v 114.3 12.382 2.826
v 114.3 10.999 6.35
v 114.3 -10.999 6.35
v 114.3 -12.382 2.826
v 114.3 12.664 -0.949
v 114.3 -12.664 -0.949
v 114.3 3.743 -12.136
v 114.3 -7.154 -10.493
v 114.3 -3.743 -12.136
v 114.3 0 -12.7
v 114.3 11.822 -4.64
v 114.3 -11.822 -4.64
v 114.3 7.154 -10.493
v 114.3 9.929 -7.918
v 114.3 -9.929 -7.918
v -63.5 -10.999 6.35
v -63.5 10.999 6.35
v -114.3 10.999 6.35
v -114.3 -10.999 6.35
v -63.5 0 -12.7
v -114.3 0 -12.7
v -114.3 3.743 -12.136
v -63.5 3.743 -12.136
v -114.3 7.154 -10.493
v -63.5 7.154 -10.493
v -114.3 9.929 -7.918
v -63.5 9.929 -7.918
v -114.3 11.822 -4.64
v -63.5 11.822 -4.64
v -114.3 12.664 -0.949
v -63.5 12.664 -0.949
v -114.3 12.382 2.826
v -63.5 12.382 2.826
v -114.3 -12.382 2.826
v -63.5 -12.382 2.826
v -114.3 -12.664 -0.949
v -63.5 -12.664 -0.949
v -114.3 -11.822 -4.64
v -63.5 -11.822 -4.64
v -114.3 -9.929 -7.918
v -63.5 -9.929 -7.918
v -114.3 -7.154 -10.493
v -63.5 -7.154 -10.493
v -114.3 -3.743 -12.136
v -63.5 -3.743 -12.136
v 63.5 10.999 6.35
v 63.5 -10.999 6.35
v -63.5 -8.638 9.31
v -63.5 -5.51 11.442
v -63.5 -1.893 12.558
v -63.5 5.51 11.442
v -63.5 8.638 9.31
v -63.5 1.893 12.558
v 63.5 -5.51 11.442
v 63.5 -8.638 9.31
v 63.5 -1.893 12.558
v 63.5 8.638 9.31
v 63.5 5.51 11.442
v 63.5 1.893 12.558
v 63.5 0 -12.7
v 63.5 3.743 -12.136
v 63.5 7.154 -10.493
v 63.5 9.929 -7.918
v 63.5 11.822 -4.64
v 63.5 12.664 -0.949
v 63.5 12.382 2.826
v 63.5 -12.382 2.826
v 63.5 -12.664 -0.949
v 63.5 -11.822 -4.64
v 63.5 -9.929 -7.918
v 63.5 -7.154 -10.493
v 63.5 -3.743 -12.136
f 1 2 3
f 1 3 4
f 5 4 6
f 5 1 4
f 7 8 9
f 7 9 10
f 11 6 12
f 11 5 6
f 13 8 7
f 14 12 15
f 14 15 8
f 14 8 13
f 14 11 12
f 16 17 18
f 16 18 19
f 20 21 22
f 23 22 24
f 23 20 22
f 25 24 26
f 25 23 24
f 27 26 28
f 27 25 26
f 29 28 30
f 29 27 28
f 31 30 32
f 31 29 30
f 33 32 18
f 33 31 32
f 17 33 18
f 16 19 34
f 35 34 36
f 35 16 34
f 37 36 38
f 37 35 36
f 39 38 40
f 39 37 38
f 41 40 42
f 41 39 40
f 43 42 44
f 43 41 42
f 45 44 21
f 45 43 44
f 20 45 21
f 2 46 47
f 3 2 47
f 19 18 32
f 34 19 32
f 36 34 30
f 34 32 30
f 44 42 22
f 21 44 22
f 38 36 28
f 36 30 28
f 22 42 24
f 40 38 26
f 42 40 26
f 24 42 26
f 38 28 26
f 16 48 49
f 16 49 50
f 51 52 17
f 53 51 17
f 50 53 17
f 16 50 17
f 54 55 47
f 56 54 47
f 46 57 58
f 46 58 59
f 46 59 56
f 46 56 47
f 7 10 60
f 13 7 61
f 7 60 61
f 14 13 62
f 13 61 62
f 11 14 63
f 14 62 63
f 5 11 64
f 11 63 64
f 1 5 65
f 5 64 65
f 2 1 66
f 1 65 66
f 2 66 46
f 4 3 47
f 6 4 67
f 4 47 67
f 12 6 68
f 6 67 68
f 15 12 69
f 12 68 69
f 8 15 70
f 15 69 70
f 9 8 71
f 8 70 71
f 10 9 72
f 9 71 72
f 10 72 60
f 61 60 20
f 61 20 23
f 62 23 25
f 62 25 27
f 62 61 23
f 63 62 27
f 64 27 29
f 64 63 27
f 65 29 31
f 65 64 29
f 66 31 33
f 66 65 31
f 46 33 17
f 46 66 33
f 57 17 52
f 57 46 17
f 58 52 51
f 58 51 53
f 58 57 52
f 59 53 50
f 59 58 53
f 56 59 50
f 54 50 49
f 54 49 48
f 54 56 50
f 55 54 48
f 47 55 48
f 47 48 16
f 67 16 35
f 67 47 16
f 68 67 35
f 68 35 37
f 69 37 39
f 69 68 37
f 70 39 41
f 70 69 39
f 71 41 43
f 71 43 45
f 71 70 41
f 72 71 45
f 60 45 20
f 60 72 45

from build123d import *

# Parameters (mm, degrees)
SKETCH1_R           = 12.7
BOSS_EXTRUDE1_DEPTH = 63.5
BOSS_EXTRUDE2_DEPTH = 50.8


with BuildPart() as part:
    # Sketch1 → Boss-Extrude1 (new body, symmetric)
    with BuildSketch(Plane(origin=(0, 0, 0), x_dir=(0, 0, -1), z_dir=(1, 0, 0))):
        Circle(SKETCH1_R)
    extrude(amount=BOSS_EXTRUDE1_DEPTH, both=True)

    # Sketch2 → Boss-Extrude2 (add)
    with BuildSketch(Plane(origin=(63.5, 0, 0), x_dir=(0, 0, -1), z_dir=(1, 0, 0))):
        with BuildLine():
            ThreePointArc((12.7, 0), (6.35, 10.998522628), (-6.35, 10.998522628))
            Line((-6.35, 10.998522628), (-6.35, -10.998522628))
            ThreePointArc((-6.35, -10.998522628), (6.35, -10.998522628), (12.7, 0))
        make_face()
    boss_extrude2 = extrude(amount=BOSS_EXTRUDE2_DEPTH)

    # Mirror1: Boss-Extrude2 across plane
    add(boss_extrude2.mirror(Plane(origin=(0, 0, 0), x_dir=(0, 0, 1), z_dir=(1, 0, 0))))


solid = part.part
